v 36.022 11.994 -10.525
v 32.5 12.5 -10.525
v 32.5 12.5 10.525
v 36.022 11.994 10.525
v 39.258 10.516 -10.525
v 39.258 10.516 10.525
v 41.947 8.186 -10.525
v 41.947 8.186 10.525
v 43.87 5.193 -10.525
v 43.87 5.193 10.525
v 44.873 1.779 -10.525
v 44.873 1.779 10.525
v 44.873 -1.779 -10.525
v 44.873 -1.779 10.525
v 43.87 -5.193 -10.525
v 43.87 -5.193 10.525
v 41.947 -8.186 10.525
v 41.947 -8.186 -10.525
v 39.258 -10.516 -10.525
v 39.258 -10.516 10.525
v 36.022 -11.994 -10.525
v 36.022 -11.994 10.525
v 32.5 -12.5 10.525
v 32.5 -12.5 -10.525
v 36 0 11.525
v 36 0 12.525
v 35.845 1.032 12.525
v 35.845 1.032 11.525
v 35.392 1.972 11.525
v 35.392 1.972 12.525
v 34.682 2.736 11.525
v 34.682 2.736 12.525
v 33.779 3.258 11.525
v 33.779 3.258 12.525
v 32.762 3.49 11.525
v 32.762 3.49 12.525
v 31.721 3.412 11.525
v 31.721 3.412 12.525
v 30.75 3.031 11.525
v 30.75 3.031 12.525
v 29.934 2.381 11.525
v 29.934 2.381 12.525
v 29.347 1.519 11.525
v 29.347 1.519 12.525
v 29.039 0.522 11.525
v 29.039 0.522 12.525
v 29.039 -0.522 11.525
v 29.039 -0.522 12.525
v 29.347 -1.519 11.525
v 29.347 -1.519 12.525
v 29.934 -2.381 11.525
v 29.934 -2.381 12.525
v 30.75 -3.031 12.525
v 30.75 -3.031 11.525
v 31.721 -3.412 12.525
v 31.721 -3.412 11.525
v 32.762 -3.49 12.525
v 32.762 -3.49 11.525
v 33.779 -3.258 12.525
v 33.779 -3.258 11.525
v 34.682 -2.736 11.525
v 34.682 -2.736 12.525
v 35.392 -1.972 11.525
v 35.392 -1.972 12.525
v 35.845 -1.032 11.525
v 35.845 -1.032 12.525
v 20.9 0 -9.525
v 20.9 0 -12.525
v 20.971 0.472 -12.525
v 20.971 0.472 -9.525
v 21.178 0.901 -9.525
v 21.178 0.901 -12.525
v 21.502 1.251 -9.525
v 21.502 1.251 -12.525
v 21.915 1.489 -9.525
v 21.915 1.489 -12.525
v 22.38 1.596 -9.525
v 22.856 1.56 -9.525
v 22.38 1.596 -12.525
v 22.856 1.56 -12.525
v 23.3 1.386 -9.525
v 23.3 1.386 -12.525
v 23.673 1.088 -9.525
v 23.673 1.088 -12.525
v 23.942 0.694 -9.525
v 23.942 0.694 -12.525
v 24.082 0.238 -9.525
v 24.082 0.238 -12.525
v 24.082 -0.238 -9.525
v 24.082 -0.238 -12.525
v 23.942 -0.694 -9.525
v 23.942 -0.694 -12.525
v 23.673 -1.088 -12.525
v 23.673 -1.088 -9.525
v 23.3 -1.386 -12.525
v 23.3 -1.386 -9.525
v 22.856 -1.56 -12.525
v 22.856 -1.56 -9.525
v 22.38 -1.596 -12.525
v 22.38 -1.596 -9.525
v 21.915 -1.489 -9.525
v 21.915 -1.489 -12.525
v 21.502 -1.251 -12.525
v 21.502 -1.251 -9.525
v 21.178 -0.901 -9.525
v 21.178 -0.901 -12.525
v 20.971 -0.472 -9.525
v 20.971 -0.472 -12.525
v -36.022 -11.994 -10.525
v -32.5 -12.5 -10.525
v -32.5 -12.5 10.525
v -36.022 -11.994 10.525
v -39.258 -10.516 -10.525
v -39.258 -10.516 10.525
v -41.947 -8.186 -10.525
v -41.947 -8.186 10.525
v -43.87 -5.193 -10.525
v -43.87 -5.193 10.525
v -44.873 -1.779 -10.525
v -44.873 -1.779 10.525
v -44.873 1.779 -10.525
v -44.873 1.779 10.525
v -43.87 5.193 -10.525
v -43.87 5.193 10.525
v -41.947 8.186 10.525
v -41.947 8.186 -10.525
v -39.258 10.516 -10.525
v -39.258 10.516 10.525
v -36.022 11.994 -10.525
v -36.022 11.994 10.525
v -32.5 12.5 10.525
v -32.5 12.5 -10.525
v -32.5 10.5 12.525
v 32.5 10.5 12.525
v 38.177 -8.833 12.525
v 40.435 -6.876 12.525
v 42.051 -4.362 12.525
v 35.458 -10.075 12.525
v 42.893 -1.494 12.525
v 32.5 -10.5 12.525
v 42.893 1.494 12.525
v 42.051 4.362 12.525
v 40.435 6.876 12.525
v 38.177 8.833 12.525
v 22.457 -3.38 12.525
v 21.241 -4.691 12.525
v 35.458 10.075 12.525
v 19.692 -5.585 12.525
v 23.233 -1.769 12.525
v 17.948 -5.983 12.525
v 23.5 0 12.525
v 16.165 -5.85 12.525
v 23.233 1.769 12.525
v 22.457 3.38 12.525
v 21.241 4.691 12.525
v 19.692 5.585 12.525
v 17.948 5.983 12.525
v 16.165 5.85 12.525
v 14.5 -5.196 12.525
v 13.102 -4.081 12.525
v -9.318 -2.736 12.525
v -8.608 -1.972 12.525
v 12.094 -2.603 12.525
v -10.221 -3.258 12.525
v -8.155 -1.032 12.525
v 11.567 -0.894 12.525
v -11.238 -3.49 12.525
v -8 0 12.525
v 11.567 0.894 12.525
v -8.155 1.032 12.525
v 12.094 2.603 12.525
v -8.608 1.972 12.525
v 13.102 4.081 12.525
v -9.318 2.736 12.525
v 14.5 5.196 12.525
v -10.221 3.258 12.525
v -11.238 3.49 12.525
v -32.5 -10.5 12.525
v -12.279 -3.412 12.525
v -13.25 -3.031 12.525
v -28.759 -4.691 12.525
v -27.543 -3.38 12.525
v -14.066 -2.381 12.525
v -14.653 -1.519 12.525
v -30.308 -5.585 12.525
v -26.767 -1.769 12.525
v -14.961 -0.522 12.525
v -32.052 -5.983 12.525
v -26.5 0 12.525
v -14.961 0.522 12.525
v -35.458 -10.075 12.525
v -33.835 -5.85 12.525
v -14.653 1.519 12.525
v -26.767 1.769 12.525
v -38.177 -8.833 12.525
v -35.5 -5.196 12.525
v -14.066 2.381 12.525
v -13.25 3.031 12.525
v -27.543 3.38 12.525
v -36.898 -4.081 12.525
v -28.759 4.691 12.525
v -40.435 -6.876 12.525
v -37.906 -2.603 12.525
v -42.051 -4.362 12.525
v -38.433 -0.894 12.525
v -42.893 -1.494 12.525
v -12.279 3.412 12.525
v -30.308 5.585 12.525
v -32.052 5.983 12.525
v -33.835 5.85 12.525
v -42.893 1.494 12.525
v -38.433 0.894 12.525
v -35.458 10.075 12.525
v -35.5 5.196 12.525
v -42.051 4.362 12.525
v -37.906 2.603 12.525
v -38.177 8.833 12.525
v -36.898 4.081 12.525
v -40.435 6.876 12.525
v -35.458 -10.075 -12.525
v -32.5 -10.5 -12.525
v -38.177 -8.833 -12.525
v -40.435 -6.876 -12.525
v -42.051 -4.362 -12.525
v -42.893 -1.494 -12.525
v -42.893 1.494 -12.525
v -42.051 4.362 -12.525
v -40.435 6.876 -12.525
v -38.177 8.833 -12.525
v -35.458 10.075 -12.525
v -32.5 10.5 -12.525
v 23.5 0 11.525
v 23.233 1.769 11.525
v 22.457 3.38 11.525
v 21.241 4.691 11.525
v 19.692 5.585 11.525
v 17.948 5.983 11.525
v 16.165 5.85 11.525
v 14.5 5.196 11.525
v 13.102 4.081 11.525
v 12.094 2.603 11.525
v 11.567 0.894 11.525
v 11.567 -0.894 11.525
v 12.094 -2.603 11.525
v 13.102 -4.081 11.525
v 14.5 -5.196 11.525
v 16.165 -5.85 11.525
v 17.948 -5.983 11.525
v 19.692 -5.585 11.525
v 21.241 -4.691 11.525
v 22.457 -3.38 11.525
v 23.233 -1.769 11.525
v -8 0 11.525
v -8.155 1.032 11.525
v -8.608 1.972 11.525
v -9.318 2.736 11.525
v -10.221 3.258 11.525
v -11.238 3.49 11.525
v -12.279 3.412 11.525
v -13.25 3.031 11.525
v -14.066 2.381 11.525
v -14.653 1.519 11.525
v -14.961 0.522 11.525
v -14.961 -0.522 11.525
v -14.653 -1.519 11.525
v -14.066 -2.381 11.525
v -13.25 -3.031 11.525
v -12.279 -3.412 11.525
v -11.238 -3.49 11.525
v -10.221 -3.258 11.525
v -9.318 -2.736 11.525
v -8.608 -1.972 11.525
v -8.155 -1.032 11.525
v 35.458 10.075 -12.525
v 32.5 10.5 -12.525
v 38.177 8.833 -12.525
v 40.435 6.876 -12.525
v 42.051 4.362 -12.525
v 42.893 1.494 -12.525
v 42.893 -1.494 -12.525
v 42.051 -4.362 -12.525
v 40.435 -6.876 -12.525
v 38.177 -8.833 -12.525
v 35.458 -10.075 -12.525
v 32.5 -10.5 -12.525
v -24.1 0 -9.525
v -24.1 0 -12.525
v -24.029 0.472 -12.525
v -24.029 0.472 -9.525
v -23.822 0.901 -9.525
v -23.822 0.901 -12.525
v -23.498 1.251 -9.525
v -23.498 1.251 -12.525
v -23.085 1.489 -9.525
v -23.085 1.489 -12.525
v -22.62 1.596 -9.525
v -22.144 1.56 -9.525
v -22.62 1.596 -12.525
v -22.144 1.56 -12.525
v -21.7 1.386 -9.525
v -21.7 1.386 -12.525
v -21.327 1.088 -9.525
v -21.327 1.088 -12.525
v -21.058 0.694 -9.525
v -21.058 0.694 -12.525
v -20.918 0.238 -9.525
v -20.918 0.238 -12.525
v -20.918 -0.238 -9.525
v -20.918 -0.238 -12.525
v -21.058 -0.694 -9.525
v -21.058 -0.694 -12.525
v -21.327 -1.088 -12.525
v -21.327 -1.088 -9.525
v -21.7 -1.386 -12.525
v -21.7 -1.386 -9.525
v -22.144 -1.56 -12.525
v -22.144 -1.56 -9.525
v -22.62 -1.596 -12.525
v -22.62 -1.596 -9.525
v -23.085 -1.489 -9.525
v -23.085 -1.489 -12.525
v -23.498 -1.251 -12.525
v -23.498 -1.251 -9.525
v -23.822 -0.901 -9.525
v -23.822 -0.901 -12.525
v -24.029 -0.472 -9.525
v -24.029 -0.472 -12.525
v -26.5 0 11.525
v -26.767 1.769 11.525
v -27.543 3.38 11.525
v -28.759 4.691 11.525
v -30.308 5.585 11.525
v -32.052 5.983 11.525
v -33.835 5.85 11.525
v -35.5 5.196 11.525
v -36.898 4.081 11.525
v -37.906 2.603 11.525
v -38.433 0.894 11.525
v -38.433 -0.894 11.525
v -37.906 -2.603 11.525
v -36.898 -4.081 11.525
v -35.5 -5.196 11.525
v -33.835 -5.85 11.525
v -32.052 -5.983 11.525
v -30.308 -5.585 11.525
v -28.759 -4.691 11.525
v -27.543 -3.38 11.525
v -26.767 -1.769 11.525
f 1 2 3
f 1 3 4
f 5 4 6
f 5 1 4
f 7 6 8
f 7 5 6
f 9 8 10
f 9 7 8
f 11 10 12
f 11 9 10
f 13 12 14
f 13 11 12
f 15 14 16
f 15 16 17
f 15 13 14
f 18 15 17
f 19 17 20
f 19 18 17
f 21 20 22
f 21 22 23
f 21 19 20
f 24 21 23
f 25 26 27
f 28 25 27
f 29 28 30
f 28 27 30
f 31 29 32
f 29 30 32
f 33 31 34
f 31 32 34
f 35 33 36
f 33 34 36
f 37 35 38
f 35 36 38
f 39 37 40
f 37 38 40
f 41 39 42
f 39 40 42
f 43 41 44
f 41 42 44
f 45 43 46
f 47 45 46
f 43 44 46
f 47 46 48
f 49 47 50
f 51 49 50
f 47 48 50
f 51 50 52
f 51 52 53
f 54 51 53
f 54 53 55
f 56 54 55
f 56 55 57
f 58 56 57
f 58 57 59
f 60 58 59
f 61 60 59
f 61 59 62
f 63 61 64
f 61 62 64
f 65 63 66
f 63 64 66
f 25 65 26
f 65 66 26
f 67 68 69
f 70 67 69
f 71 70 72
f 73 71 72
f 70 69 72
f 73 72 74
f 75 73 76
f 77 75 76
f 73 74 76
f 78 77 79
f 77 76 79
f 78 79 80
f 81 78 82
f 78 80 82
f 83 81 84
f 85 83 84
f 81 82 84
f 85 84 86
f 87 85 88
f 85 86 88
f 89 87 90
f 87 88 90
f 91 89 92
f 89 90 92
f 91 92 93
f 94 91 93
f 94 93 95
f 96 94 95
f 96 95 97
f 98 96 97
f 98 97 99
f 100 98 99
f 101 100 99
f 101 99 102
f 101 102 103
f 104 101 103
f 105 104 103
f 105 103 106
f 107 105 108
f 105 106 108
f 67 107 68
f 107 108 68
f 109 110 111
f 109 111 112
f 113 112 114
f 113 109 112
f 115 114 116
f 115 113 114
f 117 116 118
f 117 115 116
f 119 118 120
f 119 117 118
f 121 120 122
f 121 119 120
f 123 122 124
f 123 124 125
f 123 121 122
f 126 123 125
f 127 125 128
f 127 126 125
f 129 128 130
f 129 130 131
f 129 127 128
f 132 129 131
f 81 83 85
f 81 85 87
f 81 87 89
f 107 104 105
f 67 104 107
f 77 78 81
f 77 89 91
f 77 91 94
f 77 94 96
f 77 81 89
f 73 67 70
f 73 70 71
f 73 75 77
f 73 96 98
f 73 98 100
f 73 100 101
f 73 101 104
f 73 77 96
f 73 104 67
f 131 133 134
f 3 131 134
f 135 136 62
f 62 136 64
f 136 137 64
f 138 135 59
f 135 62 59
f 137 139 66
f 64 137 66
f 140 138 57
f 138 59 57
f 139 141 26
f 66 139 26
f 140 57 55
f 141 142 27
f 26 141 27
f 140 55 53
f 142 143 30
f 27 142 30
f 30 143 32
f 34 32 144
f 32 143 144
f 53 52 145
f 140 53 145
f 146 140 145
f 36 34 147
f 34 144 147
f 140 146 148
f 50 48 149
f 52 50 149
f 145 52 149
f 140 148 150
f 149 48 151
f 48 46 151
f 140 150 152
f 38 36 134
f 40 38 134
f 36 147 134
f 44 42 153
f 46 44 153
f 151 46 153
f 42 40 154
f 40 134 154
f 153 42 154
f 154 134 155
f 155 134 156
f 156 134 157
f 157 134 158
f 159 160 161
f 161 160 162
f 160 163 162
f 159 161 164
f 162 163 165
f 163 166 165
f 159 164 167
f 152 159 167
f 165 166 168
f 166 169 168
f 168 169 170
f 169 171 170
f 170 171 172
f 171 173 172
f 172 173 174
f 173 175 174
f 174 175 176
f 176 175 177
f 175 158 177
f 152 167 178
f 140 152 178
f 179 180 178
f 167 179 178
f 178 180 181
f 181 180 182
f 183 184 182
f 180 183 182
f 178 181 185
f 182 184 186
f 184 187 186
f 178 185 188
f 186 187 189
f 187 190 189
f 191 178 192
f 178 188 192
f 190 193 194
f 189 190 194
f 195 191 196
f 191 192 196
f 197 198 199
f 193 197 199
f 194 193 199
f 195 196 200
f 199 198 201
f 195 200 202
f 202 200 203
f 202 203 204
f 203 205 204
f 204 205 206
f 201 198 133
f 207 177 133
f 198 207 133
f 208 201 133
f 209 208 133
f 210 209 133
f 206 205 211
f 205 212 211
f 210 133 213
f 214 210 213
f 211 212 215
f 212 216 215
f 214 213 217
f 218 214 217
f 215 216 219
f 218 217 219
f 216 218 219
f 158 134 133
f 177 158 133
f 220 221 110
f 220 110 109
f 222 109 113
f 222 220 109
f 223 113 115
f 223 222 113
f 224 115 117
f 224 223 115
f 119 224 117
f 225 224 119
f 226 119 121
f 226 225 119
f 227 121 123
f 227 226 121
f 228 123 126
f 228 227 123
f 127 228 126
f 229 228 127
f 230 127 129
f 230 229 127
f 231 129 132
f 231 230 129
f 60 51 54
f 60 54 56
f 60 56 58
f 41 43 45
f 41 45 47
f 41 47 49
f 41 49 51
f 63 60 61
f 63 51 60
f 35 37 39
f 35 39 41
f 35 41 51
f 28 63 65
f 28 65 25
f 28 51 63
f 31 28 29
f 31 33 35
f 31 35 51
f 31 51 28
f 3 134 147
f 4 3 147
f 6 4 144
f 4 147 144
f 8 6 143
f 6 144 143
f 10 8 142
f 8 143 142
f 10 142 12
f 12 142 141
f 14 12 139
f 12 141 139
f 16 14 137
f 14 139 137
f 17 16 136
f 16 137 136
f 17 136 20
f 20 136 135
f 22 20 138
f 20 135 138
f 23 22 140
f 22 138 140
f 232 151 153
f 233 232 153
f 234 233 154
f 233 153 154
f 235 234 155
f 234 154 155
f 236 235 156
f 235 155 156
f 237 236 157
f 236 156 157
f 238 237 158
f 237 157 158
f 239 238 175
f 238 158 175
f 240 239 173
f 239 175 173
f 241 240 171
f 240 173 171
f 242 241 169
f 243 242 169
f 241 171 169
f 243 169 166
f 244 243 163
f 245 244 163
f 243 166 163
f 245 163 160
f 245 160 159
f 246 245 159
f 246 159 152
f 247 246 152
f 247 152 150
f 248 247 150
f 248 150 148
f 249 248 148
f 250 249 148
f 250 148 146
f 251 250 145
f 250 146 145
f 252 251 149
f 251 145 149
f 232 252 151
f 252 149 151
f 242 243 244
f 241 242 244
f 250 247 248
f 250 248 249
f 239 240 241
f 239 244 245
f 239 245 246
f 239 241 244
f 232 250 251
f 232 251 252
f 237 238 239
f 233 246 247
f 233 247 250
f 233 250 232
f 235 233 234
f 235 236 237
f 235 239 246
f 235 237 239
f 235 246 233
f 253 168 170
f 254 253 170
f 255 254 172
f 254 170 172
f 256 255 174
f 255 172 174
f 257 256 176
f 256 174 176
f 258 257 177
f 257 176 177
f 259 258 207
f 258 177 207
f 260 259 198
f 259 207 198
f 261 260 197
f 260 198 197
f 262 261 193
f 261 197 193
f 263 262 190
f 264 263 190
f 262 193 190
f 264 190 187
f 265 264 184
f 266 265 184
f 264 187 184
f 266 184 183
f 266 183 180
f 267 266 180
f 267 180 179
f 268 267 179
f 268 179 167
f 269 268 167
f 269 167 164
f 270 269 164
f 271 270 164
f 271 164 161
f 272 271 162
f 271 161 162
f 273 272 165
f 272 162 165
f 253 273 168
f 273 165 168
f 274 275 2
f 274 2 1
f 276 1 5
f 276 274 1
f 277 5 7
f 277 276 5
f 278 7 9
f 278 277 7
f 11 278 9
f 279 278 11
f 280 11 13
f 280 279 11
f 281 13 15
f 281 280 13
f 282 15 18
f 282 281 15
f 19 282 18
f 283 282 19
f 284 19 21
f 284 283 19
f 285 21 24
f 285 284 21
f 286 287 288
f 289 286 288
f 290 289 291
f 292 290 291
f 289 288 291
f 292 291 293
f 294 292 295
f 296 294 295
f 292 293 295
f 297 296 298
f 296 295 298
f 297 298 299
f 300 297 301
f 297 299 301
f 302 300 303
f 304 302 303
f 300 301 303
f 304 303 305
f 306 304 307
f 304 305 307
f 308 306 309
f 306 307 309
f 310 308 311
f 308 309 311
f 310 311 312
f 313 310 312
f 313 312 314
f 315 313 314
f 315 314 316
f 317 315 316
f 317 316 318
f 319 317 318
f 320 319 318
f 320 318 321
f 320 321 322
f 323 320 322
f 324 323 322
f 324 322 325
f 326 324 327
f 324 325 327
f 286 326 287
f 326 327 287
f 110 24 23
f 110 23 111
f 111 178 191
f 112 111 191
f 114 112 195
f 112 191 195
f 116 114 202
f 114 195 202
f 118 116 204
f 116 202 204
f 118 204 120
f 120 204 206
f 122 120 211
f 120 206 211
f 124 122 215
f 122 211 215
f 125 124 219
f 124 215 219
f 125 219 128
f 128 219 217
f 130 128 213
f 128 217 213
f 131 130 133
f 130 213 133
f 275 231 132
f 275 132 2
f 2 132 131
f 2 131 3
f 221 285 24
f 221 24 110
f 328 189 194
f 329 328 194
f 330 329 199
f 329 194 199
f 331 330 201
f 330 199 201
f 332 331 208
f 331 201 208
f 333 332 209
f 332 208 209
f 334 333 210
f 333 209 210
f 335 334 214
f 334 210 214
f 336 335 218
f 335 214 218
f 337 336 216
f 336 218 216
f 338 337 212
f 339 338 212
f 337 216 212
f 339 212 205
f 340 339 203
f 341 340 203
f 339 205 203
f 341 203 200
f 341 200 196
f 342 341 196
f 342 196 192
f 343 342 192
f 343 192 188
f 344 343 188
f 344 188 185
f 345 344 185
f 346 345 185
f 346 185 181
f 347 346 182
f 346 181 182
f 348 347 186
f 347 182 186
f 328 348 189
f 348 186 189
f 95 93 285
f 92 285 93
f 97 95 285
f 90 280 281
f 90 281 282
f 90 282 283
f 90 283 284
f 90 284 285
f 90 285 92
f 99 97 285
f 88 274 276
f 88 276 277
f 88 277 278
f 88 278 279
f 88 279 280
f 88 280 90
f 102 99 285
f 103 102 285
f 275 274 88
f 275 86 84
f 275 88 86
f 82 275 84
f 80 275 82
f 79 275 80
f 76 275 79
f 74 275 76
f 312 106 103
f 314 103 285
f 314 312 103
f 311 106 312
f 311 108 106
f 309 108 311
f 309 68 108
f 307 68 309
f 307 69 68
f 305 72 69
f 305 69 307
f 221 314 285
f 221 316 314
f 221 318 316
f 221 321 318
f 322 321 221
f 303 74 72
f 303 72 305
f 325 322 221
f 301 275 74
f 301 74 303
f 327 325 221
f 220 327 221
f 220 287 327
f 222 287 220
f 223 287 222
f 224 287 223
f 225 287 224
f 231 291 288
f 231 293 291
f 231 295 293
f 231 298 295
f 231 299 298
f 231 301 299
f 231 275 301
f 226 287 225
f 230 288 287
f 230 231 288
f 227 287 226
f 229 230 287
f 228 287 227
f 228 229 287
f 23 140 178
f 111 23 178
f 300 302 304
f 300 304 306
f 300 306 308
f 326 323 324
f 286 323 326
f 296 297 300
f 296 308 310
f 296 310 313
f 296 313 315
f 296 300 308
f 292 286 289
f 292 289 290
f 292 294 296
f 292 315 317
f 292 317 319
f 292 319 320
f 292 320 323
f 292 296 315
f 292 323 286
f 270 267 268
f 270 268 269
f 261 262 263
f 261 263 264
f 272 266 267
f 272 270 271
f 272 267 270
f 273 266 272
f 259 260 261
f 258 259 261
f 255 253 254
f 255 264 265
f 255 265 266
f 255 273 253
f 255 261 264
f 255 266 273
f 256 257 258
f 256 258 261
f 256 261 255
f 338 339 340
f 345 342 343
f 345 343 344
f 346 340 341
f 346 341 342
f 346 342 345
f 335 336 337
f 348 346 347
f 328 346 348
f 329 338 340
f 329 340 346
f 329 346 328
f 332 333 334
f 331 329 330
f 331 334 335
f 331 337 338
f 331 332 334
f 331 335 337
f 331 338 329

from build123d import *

# Parameters (mm, degrees)
BOSS_EXTRUDE1_DEPTH      = 12.525
BOSS_EXTRUDE1_DEPTH_BACK = 12.525
SKETCH2_R                = 6
SKETCH2_R_2              = 3.5
CUT_EXTRUDE1_DEPTH       = 1
SKETCH3_R                = 1.6
CUT_EXTRUDE2_DEPTH       = 3
CHAMFER1_SIZE            = 2


with BuildPart() as part:
    # Sketch1 → Boss-Extrude1 (new, two sides: drawn at the far end of the back side and taken through both)
    with BuildSketch(Plane.XY.offset(-BOSS_EXTRUDE1_DEPTH_BACK)):
        with BuildLine():
            Line((-32.5, 12.5), (32.5, 12.5))
            ThreePointArc((32.5, 12.5), (45, 0), (32.5, -12.5))
            Line((32.5, -12.5), (-32.5, -12.5))
            ThreePointArc((-32.5, -12.5), (-45, 0), (-32.5, 12.5))
        make_face()
    extrude(amount=BOSS_EXTRUDE1_DEPTH + BOSS_EXTRUDE1_DEPTH_BACK)

    # Sketch2 → Cut-Extrude1 (cut)
    with BuildSketch(Plane.XY.offset(12.525)):
        with Locations((-32.5, 0)):
            Circle(SKETCH2_R)
        with Locations((-11.5, 0)):
            Circle(SKETCH2_R_2)
        with Locations((17.5, 0)):
            Circle(SKETCH2_R)
        with Locations((32.5, 0)):
            Circle(SKETCH2_R_2)
    extrude(amount=-CUT_EXTRUDE1_DEPTH, mode=Mode.SUBTRACT)

    # Sketch3 → Cut-Extrude2 (cut)
    with BuildSketch(Plane(origin=(0, 0, -12.525), x_dir=(-1, 0, 0), z_dir=(0, 0, -1))):
        with Locations((22.5, 0)):
            Circle(SKETCH3_R)
        with Locations((-22.5, 0)):
            Circle(SKETCH3_R)
    extrude(amount=-CUT_EXTRUDE2_DEPTH, mode=Mode.SUBTRACT)

    # Chamfer1
    chamfer1_edges = [part.edges().sort_by_distance(p)[0] for p in [
        (-45, 0, 12.525),
        (45, 0, -12.525),
        (0, -12.5, 12.525),
        (45, 0, 12.525),
        (0, 12.5, 12.525),
        (0, 12.5, -12.525),
        (-45, 0, -12.525),
        (0, -12.5, -12.525),
    ]]
    chamfer(chamfer1_edges, length=CHAMFER1_SIZE)


solid = part.part
